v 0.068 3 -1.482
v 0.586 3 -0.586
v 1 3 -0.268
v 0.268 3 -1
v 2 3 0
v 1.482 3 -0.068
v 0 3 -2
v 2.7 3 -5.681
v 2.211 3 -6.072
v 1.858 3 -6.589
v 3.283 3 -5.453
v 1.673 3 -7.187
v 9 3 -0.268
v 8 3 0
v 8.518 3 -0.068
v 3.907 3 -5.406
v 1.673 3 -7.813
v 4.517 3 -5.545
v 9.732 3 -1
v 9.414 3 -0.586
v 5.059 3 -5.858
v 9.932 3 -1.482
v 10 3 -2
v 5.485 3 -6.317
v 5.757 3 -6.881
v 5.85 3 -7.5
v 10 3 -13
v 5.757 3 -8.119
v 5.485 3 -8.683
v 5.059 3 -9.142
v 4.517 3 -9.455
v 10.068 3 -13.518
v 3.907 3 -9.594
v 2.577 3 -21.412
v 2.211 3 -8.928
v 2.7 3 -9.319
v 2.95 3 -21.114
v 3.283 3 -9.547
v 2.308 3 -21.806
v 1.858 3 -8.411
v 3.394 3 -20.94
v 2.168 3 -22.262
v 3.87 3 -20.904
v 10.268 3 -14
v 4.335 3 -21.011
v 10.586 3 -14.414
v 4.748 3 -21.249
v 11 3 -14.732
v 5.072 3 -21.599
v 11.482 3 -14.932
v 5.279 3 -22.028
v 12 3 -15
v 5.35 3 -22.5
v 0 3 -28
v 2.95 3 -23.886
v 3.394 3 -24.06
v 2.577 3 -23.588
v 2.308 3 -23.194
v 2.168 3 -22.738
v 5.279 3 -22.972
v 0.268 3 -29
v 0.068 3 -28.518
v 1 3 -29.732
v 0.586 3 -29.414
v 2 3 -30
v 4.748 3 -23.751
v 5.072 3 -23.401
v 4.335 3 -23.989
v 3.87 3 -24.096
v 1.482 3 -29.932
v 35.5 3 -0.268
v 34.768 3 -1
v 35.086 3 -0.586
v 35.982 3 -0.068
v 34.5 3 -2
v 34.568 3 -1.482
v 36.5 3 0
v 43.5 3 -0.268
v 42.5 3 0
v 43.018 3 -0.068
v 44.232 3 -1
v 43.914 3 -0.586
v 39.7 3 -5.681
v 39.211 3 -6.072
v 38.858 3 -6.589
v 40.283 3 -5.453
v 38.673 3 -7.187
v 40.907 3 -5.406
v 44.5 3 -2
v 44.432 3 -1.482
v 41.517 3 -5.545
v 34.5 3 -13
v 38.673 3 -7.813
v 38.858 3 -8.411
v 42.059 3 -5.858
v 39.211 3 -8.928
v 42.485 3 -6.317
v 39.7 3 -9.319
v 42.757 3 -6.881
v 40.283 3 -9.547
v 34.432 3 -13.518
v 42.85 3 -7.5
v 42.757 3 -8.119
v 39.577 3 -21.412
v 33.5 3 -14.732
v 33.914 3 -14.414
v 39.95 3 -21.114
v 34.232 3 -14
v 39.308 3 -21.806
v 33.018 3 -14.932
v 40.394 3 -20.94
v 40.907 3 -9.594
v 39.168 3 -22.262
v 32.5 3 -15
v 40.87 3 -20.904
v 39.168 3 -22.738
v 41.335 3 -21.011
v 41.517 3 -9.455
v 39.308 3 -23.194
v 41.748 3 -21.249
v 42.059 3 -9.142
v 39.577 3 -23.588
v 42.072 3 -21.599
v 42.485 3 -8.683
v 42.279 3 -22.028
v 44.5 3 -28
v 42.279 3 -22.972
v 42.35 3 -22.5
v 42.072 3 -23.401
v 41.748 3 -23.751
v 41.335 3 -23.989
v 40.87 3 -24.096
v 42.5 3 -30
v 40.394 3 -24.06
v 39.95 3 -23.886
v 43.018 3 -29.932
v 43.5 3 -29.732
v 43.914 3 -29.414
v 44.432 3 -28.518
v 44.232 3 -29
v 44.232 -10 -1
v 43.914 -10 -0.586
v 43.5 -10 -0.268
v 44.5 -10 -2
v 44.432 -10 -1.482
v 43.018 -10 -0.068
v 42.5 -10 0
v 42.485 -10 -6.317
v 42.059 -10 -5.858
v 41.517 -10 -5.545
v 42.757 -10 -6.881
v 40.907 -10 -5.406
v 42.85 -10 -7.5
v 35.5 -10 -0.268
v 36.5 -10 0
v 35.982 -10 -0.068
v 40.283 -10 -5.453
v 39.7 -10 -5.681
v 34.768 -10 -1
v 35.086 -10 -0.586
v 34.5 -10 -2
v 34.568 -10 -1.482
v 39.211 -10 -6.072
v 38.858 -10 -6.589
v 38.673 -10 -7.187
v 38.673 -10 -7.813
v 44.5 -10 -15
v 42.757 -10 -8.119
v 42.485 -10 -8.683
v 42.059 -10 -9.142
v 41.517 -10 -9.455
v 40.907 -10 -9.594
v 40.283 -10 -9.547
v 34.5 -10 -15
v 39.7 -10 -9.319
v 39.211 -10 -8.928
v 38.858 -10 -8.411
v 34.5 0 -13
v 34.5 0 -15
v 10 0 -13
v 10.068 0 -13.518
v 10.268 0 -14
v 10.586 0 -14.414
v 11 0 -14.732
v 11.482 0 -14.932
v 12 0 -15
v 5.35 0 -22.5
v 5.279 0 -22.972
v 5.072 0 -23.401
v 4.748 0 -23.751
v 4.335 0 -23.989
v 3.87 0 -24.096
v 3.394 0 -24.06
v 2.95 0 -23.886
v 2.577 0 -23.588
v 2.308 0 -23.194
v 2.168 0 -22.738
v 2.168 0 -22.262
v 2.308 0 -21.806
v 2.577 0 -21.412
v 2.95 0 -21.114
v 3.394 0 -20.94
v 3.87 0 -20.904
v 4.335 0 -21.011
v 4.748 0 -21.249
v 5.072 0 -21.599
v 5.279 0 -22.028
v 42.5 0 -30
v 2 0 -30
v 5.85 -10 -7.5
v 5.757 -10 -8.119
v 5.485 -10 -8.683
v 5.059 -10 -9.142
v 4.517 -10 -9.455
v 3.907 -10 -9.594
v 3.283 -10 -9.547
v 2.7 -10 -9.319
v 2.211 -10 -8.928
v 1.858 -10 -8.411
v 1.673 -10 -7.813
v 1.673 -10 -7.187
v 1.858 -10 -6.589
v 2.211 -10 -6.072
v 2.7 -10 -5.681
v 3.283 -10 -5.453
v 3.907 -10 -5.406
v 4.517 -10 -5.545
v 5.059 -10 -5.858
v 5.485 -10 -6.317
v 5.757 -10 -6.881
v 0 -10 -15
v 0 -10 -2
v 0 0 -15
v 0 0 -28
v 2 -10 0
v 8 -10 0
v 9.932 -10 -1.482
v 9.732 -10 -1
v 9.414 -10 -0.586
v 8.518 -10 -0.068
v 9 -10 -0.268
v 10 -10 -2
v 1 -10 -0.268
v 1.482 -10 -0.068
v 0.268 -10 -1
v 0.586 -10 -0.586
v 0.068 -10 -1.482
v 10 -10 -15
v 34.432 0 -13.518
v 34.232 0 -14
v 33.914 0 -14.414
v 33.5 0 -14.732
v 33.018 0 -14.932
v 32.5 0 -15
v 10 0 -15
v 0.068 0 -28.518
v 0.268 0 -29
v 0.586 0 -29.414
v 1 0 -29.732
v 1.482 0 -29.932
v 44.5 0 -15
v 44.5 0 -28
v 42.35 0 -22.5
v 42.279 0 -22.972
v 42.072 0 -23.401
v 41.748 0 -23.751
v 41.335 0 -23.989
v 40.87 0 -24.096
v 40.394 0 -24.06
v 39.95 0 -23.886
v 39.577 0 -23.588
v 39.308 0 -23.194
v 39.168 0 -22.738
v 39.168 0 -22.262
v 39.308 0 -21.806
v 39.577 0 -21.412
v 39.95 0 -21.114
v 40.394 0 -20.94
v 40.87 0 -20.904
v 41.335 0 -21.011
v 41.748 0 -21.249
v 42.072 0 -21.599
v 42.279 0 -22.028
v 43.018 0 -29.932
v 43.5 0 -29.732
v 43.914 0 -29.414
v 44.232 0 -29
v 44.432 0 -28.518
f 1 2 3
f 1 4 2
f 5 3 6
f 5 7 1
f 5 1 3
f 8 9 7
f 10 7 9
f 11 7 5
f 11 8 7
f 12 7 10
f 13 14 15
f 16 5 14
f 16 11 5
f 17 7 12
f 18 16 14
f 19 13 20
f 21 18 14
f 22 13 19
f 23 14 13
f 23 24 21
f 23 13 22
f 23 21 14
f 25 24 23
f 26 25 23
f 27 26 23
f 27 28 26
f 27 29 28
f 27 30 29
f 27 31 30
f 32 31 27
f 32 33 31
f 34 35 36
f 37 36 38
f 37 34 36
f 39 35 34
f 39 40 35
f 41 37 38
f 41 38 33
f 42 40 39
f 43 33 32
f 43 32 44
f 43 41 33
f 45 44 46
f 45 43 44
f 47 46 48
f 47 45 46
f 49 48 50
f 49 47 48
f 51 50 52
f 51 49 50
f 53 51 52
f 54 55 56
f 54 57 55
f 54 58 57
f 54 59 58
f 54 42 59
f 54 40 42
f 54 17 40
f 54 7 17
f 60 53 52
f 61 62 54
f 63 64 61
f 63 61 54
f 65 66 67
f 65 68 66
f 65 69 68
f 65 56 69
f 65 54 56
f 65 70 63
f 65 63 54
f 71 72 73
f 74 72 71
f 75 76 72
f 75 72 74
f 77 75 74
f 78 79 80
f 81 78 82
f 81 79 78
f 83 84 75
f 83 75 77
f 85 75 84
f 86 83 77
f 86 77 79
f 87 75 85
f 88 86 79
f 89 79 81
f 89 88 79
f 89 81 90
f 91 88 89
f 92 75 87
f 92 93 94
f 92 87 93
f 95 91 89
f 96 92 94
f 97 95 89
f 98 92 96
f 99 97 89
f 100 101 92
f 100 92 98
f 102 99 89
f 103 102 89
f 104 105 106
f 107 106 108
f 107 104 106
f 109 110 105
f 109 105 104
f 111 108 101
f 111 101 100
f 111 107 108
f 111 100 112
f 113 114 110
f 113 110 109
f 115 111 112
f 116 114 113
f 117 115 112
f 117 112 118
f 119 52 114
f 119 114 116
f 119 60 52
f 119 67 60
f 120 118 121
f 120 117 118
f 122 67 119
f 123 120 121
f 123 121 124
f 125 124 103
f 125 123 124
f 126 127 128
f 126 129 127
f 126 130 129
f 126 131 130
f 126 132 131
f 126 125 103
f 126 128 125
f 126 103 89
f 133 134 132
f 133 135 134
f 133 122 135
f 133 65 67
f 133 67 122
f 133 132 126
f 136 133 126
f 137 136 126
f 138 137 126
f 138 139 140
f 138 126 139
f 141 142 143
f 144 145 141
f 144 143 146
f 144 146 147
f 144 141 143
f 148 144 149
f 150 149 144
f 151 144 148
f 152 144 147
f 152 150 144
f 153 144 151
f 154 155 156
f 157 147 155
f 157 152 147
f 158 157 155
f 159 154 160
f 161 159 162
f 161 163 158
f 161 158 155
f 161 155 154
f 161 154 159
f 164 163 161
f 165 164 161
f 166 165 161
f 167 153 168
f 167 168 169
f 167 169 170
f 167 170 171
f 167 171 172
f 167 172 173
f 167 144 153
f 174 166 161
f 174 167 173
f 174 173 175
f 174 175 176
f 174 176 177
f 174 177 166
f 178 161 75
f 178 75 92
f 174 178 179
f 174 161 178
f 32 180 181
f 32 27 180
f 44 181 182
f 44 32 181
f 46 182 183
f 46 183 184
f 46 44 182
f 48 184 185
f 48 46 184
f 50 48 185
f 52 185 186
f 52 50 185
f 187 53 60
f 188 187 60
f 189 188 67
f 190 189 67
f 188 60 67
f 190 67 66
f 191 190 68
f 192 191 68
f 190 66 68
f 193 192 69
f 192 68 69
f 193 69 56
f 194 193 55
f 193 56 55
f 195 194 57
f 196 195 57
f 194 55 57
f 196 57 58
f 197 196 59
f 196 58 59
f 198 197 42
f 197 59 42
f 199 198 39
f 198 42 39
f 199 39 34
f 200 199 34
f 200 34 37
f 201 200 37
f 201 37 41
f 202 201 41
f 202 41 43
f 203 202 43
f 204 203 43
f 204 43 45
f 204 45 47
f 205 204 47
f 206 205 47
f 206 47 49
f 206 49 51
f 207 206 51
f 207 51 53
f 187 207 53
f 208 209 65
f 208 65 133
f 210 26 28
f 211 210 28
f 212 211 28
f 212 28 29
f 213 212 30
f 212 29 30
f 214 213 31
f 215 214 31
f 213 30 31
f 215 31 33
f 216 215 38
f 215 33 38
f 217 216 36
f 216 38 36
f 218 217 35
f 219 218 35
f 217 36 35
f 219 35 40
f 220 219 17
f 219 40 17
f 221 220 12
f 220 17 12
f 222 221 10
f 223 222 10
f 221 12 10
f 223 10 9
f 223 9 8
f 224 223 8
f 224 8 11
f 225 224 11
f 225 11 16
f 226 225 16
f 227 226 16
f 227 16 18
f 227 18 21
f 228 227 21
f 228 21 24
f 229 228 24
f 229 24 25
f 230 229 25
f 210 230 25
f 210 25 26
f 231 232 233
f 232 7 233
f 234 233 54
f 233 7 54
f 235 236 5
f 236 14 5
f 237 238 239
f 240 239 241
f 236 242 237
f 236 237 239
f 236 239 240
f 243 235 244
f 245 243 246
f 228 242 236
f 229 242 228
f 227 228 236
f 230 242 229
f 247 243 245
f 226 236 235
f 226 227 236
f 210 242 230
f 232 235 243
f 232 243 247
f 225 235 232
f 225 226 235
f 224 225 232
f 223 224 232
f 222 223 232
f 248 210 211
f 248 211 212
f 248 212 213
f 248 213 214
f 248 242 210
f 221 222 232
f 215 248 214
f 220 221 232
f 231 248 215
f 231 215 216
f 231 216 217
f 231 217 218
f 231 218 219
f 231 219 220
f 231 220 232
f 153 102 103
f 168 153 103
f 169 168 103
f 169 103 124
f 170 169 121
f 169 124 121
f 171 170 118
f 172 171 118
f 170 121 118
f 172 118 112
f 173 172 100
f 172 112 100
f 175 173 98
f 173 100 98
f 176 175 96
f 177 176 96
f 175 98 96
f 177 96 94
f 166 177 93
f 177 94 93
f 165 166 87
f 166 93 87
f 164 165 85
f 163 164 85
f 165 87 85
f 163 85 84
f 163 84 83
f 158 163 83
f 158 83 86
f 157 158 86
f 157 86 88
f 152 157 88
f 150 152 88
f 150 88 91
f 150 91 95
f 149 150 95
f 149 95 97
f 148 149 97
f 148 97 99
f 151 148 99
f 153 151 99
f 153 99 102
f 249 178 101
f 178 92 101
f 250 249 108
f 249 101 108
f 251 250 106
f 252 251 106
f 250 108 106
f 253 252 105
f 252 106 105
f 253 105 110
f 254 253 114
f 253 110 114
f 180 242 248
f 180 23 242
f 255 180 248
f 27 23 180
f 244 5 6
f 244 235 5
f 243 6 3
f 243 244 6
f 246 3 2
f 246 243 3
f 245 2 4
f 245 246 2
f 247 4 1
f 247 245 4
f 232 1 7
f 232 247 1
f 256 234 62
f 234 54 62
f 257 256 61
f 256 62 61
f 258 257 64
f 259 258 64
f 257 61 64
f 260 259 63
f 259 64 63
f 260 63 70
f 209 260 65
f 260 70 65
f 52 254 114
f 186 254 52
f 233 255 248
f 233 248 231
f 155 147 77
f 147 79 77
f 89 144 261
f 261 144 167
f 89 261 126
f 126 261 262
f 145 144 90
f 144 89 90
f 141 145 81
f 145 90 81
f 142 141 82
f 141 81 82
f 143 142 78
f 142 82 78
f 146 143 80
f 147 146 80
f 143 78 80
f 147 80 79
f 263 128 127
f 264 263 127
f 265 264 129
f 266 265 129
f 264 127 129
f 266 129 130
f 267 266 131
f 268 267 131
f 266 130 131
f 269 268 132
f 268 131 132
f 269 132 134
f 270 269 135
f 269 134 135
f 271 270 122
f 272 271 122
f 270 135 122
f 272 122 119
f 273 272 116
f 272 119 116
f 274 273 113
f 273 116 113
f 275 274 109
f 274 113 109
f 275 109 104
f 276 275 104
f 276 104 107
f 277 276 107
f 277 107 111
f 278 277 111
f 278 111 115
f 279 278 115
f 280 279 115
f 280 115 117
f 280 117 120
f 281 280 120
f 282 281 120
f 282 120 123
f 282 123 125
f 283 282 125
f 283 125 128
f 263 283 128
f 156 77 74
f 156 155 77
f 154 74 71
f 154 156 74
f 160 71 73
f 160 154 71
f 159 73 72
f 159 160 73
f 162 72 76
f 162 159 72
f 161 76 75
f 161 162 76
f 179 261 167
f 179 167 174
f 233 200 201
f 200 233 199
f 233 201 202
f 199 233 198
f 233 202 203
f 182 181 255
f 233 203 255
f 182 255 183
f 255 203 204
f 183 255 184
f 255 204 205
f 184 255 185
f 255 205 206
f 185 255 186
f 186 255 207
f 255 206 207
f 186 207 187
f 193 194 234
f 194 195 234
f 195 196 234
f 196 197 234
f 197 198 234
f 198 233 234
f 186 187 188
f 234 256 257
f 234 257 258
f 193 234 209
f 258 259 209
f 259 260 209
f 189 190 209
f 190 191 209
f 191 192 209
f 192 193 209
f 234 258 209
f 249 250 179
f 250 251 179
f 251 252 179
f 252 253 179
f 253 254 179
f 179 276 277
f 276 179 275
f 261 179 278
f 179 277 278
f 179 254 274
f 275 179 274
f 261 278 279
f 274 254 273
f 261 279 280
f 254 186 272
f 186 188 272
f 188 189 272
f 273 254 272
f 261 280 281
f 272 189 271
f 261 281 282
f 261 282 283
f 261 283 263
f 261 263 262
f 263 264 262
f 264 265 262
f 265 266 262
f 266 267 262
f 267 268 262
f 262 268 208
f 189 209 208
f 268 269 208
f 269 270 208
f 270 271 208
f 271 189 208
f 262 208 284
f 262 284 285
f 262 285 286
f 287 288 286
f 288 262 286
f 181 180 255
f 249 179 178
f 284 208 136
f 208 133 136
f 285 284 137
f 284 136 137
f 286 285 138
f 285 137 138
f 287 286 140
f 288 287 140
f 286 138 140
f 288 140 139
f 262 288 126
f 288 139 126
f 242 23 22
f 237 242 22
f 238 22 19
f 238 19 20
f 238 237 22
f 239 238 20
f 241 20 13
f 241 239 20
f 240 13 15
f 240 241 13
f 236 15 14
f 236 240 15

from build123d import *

# Parameters (mm, degrees)
SKETCH_1_W          = 44.5
SKETCH_1_H          = 30
EXTRUDE_1_DEPTH     = 3
SKETCH_2_W          = 10
SKETCH_2_H          = 15
EXTRUDE_2_DEPTH     = 10
SKETCH_3_R          = 2.1
SKETCH_3_R_2        = 1.6
CUT_EXTRUDE_1_DEPTH = 45
SKETCH_4_W          = 24.5
SKETCH_4_H          = 15
CUT_EXTRUDE_2_DEPTH = 10
FILLET_2_R          = 2


with BuildPart() as part:
    # ｽｹｯﾁ1 → ﾎﾞｽ - 押し出し1 (new body)
    with BuildSketch(Plane(origin=(0, 0, 0), x_dir=(1, 0, 0), z_dir=(0, 1, 0))):
        with Locations((22.25, 15)):
            Rectangle(SKETCH_1_W, SKETCH_1_H)
    extrude(amount=EXTRUDE_1_DEPTH)

    # ｽｹｯﾁ2 → ﾎﾞｽ - 押し出し2 (add)
    with BuildSketch(Plane(origin=(0, 0, 0), x_dir=(-1, 0, 0), z_dir=(0, -1, 0))):
        with Locations((-5, 7.5)):
            Rectangle(SKETCH_2_W, SKETCH_2_H)
        with Locations((-39.5, 7.5)):
            Rectangle(SKETCH_2_W, SKETCH_2_H)
    extrude(amount=EXTRUDE_2_DEPTH)

    # ｽｹｯﾁ3 → ｶｯﾄ - 押し出し1 (cut)
    with BuildSketch(Plane(origin=(0, 3, 0), x_dir=(1, 0, 0), z_dir=(0, 1, 0))):
        with Locations((3.75, 7.5)):
            Circle(SKETCH_3_R)
        with Locations((40.75, 7.5)):
            Circle(SKETCH_3_R)
        with Locations((40.75, 22.5)):
            Circle(SKETCH_3_R_2)
        with Locations((3.75, 22.5)):
            Circle(SKETCH_3_R_2)
    extrude(amount=-CUT_EXTRUDE_1_DEPTH, mode=Mode.SUBTRACT)

    # ｽｹｯﾁ4 → ｶｯﾄ - 押し出し2 (cut)
    with BuildSketch(Plane(origin=(0, 0, 0), x_dir=(-1, 0, 0), z_dir=(0, -1, 0))):
        with Locations((-22.25, 7.5)):
            Rectangle(SKETCH_4_W, SKETCH_4_H)
    extrude(amount=-CUT_EXTRUDE_2_DEPTH, mode=Mode.SUBTRACT)

    # ﾌｨﾚｯﾄ2
    fillet_2_edges = [part.edges().sort_by_distance(p)[0] for p in [
        (10, -3.5, 0),
        (34.5, -3.5, 0),
        (10, 1.5, -15),
        (34.5, 1.5, -15),
        (0, 1.5, -30),
        (44.5, 1.5, -30),
        (44.5, -3.5, 0),
        (0, -3.5, 0),
    ]]
    fillet(fillet_2_edges, radius=FILLET_2_R)


solid = part.part
